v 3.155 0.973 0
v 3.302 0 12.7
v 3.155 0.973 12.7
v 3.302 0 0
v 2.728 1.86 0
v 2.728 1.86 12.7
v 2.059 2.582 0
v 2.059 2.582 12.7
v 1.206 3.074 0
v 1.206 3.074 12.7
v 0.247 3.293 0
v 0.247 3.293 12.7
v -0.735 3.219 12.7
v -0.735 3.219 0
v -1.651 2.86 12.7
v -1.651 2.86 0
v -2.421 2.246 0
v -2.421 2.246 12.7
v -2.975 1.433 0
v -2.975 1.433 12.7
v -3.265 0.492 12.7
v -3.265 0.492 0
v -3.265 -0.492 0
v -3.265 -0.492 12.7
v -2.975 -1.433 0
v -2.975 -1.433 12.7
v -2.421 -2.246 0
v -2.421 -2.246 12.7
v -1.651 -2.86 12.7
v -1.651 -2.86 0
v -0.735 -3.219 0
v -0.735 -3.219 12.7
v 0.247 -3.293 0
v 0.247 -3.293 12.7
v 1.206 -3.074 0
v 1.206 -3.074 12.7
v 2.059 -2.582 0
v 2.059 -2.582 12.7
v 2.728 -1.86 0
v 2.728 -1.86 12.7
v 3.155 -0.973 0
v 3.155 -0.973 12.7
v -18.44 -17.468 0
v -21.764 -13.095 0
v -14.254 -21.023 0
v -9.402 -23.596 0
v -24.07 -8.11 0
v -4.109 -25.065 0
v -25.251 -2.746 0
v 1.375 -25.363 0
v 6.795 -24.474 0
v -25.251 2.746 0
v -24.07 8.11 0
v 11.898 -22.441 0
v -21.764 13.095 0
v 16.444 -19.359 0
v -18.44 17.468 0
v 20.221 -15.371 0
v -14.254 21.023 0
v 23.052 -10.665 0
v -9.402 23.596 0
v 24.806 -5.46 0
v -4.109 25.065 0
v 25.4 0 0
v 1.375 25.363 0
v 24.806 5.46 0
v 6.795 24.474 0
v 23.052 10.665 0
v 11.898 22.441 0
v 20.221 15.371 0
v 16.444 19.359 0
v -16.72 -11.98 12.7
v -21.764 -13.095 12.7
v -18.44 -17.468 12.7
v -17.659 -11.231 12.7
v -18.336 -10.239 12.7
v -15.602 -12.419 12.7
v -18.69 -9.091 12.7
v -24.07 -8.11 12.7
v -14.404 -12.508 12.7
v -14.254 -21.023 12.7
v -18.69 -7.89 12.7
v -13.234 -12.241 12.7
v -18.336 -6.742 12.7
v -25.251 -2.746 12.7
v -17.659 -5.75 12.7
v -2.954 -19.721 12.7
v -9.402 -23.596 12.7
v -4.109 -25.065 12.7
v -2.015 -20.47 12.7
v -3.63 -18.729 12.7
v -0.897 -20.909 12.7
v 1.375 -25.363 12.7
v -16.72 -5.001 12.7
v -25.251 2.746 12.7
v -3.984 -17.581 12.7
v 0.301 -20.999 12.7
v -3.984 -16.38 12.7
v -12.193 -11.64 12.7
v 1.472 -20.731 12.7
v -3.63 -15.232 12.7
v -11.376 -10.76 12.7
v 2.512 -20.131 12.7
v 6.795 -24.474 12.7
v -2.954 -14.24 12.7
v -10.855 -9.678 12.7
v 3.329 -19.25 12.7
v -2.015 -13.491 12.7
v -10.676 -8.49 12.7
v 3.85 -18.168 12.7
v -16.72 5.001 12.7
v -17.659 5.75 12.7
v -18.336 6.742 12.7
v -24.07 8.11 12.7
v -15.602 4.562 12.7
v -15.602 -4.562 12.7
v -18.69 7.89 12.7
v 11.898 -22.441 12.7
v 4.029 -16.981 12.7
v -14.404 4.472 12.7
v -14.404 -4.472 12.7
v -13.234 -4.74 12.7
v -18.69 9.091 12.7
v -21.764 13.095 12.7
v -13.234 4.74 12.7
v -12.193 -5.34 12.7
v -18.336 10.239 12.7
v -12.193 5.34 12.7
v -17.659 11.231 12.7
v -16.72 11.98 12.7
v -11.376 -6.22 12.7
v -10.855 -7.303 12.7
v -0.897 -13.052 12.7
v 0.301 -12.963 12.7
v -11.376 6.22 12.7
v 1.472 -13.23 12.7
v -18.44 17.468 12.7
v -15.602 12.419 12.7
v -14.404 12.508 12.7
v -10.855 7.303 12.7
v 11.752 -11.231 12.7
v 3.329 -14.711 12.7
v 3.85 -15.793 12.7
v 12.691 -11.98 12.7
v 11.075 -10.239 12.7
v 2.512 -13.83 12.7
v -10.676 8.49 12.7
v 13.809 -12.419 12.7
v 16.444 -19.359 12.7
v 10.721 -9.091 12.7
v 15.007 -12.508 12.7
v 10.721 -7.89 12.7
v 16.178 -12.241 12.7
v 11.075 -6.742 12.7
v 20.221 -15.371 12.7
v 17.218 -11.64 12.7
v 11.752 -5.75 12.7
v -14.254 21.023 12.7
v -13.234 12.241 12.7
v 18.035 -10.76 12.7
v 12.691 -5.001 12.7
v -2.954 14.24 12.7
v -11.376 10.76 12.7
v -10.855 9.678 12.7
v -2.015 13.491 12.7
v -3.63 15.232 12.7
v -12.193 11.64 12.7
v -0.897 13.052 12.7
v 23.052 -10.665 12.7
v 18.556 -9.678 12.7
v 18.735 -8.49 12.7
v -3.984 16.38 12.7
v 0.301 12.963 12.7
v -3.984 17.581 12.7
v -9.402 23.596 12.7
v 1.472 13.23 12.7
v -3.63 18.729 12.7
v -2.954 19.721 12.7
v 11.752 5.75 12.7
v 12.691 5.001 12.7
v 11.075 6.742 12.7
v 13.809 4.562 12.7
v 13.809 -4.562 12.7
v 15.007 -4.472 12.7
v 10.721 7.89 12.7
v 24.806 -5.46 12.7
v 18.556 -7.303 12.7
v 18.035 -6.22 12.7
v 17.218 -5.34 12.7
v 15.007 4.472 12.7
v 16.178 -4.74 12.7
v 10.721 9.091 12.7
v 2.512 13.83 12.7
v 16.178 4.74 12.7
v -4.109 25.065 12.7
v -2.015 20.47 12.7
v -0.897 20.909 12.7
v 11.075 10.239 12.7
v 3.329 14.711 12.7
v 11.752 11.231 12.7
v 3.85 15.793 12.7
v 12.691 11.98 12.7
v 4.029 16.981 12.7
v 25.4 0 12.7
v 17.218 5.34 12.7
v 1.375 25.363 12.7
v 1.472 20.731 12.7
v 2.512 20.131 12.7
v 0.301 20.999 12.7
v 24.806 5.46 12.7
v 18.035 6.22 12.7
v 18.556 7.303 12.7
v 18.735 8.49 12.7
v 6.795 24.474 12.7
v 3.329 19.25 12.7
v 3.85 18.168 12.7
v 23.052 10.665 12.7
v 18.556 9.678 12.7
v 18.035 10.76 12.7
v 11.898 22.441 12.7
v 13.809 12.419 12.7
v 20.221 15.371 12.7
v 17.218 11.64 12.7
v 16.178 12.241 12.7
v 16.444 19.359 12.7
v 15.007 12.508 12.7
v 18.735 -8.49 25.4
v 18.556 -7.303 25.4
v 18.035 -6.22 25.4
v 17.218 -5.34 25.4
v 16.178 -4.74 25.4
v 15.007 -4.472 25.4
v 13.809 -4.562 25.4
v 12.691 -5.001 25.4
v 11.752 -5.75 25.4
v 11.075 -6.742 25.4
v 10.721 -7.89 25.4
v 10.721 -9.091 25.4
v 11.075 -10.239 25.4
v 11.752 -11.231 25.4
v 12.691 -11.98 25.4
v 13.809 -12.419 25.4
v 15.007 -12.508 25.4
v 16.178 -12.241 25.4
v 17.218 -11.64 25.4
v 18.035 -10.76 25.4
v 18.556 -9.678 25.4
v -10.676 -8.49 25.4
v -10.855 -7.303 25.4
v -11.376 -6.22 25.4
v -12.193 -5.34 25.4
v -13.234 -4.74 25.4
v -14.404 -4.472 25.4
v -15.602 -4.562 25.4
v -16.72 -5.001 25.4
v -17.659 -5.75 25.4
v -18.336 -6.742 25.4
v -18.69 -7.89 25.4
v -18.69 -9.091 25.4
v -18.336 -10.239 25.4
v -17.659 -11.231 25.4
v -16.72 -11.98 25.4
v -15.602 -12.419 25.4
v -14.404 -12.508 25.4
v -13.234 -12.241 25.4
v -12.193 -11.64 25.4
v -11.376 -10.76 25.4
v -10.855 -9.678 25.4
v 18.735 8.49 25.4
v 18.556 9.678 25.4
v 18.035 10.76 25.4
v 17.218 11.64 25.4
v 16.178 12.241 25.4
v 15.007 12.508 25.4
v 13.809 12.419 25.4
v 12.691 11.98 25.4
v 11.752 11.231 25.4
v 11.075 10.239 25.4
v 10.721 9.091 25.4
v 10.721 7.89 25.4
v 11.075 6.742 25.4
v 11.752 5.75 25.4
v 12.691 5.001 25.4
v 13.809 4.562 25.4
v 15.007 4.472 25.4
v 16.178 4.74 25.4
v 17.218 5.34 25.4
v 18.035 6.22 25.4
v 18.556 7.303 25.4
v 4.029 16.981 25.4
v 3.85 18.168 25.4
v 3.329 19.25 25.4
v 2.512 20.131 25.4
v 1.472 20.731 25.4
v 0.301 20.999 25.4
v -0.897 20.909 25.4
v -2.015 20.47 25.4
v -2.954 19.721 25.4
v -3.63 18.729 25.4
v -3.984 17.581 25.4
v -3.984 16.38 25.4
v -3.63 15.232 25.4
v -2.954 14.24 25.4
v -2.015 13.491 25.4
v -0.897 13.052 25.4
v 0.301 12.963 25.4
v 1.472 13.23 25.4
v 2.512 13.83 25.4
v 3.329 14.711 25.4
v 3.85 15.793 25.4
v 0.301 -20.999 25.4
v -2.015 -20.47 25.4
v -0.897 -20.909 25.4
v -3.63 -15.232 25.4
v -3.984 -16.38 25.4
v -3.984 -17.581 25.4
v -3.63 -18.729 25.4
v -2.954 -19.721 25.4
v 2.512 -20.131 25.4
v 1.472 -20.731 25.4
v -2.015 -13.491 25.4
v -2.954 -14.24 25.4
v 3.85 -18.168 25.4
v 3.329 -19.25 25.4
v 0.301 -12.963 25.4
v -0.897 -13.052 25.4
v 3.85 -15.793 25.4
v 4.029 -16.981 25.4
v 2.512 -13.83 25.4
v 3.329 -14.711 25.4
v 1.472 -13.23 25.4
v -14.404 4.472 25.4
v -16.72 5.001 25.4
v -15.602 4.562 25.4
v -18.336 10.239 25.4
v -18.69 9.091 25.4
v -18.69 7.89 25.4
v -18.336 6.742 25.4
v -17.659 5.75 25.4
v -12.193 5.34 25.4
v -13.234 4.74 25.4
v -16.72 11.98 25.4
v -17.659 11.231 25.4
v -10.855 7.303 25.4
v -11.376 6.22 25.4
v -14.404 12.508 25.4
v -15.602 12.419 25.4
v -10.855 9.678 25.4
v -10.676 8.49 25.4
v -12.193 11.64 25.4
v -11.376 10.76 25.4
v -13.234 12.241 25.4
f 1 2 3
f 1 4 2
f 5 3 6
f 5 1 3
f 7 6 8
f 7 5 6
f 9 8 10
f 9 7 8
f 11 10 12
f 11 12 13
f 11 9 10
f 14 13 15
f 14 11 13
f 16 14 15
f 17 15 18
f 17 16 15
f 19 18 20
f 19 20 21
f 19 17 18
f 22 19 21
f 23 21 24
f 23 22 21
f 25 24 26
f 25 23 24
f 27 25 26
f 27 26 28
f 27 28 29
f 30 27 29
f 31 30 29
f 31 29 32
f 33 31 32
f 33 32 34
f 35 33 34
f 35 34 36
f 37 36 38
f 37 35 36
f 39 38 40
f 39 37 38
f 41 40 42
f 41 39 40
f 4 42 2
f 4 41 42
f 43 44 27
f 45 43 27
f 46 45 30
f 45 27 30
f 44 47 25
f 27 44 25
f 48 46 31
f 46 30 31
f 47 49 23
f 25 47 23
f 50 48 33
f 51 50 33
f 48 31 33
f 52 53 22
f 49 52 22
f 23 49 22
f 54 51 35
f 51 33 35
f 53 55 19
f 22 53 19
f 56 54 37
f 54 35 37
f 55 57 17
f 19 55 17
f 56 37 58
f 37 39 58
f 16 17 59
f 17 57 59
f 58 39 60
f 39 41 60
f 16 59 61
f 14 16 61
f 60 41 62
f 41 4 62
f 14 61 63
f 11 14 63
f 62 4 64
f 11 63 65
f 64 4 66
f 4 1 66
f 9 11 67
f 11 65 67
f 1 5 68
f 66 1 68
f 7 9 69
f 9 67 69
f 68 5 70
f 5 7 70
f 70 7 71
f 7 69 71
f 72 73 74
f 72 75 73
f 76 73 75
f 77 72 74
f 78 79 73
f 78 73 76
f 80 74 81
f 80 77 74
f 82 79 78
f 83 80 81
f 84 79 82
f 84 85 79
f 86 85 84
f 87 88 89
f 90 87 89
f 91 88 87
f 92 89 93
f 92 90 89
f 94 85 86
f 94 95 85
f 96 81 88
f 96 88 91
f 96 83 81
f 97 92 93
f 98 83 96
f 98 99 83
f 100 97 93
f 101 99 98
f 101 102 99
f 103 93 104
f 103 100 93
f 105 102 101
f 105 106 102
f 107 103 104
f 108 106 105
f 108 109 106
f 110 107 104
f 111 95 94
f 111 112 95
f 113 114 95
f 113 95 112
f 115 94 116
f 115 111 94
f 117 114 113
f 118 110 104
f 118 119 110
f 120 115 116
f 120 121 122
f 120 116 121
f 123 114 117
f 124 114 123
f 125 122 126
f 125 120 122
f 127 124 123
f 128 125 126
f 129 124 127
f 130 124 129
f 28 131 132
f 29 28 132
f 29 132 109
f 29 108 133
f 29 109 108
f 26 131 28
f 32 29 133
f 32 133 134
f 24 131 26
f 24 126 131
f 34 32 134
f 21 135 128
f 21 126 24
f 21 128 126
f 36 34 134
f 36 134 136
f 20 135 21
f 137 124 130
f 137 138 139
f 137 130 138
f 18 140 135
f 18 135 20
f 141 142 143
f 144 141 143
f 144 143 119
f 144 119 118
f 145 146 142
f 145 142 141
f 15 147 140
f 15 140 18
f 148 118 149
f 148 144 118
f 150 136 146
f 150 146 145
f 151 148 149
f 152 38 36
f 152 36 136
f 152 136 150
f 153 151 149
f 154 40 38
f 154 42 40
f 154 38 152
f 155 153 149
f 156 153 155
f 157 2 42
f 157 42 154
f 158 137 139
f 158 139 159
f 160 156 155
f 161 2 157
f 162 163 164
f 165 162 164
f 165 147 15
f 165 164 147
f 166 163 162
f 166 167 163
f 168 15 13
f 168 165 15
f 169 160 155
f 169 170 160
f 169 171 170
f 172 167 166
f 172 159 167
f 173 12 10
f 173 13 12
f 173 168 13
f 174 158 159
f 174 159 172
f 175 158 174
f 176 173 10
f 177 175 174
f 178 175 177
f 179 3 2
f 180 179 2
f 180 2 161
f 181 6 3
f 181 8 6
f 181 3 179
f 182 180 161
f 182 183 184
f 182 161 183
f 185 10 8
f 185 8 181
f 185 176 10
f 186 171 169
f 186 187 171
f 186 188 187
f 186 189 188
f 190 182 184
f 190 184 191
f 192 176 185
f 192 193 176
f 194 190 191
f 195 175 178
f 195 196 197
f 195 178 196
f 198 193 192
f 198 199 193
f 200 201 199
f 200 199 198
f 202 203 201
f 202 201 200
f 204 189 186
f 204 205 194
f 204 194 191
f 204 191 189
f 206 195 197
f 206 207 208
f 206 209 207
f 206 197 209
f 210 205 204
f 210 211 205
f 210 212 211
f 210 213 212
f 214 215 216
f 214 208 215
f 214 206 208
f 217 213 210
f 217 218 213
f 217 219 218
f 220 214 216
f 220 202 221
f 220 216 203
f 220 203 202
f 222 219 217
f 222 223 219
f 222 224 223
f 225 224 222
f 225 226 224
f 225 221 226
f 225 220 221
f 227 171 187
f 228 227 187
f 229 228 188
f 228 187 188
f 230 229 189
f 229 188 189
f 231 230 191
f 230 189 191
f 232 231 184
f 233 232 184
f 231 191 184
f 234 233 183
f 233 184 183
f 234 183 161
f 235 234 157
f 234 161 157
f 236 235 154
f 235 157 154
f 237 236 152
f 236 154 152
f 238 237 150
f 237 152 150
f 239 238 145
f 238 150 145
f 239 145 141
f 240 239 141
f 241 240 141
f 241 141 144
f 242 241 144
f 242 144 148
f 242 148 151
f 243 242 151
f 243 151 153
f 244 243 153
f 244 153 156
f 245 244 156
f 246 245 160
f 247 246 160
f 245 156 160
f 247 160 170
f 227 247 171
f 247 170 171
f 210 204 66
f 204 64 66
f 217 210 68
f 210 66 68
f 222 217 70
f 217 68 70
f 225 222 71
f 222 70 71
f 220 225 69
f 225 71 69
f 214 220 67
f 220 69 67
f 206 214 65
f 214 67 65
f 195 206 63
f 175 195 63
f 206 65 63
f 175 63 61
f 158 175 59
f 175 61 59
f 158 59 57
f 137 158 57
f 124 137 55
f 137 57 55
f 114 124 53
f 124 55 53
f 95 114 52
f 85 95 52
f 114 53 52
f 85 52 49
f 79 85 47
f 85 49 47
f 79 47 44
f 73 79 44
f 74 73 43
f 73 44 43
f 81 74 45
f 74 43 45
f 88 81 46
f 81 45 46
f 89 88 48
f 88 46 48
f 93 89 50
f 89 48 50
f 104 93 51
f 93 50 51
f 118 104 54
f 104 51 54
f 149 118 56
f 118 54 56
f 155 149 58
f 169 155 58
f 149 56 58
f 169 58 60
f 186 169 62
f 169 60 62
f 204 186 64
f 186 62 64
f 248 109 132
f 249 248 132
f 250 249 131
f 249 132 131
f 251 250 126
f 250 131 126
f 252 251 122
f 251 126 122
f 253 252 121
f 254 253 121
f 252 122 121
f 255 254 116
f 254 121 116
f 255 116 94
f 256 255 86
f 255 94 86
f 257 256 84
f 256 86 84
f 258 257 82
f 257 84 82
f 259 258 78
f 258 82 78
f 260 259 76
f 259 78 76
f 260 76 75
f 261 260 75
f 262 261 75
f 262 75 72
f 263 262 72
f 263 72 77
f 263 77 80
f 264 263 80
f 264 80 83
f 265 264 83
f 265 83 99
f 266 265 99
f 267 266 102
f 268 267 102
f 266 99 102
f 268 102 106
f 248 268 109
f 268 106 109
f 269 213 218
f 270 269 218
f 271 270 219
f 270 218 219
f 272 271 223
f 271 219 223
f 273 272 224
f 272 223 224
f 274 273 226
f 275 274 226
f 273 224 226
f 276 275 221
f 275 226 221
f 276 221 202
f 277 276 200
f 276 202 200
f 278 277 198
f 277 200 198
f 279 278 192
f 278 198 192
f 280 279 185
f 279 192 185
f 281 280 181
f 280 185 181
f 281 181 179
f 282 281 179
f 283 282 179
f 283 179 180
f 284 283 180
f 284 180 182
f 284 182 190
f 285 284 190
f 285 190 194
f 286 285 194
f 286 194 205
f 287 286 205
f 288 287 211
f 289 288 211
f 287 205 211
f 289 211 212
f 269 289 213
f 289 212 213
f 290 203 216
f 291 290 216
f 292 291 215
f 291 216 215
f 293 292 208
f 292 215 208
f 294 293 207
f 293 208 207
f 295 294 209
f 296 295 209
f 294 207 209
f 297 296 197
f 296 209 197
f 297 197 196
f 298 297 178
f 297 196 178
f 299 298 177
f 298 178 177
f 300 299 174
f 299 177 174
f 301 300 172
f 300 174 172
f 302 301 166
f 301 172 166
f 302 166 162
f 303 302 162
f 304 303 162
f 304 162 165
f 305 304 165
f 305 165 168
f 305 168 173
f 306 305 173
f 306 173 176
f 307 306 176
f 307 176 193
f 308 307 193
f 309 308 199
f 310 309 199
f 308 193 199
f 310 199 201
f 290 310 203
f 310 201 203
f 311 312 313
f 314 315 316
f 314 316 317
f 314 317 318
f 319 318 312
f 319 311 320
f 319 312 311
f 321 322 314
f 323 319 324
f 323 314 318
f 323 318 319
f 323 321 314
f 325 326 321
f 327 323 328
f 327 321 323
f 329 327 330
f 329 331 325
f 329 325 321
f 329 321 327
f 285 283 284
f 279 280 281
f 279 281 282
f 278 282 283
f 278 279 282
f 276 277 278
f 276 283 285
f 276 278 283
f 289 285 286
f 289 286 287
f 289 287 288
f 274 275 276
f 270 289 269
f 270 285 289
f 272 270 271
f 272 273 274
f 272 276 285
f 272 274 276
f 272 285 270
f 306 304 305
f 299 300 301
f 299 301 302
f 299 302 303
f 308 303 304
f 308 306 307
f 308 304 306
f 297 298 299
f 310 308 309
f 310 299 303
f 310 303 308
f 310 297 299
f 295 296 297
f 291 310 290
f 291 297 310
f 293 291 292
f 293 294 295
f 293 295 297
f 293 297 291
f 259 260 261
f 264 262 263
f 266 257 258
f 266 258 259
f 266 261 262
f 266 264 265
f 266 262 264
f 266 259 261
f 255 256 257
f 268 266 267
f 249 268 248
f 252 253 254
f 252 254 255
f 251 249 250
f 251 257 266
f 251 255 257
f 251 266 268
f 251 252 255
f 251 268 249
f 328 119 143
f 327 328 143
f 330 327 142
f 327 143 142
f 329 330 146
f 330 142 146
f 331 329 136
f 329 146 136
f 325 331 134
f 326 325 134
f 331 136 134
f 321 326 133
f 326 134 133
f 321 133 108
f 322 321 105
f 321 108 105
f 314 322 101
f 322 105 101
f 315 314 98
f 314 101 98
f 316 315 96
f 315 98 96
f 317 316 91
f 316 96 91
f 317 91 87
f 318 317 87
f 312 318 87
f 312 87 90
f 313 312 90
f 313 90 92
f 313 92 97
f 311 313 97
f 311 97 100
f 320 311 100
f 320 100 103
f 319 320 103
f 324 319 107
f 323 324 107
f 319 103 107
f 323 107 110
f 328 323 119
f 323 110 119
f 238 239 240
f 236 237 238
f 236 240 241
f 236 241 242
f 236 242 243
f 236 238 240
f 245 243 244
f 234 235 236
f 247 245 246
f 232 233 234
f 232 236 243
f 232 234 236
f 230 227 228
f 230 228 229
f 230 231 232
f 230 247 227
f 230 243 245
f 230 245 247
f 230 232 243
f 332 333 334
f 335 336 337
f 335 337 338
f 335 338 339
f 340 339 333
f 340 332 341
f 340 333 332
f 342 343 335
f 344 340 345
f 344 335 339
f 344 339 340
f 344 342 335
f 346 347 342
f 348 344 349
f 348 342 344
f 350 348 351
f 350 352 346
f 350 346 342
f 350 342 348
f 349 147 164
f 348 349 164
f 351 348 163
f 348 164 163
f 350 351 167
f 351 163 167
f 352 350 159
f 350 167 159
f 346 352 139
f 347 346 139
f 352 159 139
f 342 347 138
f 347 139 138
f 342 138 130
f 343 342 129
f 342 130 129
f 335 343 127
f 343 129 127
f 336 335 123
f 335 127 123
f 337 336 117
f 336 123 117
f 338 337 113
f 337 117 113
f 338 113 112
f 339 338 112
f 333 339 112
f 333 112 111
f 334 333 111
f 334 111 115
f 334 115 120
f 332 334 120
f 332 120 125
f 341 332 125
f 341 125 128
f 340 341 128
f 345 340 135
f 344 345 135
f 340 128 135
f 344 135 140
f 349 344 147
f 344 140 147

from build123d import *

# Parameters (mm, degrees)
F0_R     = 25.4
F0_R_2   = 2.8345599267
F0_R_3   = 3.302
F1_DEPTH = 6.35
F2_DEPTH = 6.35
F3_R     = 4.0292814374
F4_DEPTH = 12.7


with BuildPart() as f1:
    # F0 (on Top) → F1 (new body)
    with BuildSketch(Plane.XY):
        Circle(F0_R)
        with Locations((-13.4316211013, -13.4316211013)):
            Circle(F0_R_2, mode=Mode.SUBTRACT)
        with Locations((0, -18.9951807261)):
            Circle(F0_R_2, mode=Mode.SUBTRACT)
        with Locations((-18.9951807261, 0)):
            Circle(F0_R_2, mode=Mode.SUBTRACT)
        Circle(F0_R_3, mode=Mode.SUBTRACT)
        with Locations((13.4316211013, -13.4316211013)):
            Circle(F0_R_2, mode=Mode.SUBTRACT)
        with Locations((18.9951807261, 0)):
            Circle(F0_R_2, mode=Mode.SUBTRACT)
        with Locations((-13.4316211013, 13.4316211013)):
            Circle(F0_R_2, mode=Mode.SUBTRACT)
        with Locations((0, 18.9951807261)):
            Circle(F0_R_2, mode=Mode.SUBTRACT)
        with Locations((13.4316211013, 13.4316211013)):
            Circle(F0_R_2, mode=Mode.SUBTRACT)
        with Locations((-18.9951807261, 0)):
            Circle(F0_R_2)
        with Locations((-13.4316211013, 13.4316211013)):
            Circle(F0_R_2)
        with Locations((0, 18.9951807261)):
            Circle(F0_R_2)
        with Locations((13.4316211013, 13.4316211013)):
            Circle(F0_R_2)
        with Locations((18.9951807261, 0)):
            Circle(F0_R_2)
        with Locations((0, -18.9951807261)):
            Circle(F0_R_2)
        with Locations((13.4316211013, -13.4316211013)):
            Circle(F0_R_2)
        with Locations((-13.4316211013, -13.4316211013)):
            Circle(F0_R_2)
    extrude(amount=F1_DEPTH)

    # F2 (add): a face of the model
    f2_faces = [f1.faces().sort_by_distance(p)[0] for p in [
        (-24.6815795103, 0, 6.35),
    ]]
    extrude(f2_faces, amount=F2_DEPTH)

    # F3 (on face) → F4 (join)
    with BuildSketch(Plane.XY.offset(12.7)):
        with Locations((0, 16.9805400074)):
            Circle(F3_R)
        with Locations((-14.7055790163, 8.4902700037)):
            Circle(F3_R)
        with Locations((-14.7055790163, -8.4902700037)):
            Circle(F3_R)
        with Locations((0, -16.9805400074)):
            Circle(F3_R)
        with Locations((14.7055790163, -8.4902700037)):
            Circle(F3_R)
        with Locations((14.7055790163, 8.4902700037)):
            Circle(F3_R)
    extrude(amount=F4_DEPTH)


solid = f1.part
